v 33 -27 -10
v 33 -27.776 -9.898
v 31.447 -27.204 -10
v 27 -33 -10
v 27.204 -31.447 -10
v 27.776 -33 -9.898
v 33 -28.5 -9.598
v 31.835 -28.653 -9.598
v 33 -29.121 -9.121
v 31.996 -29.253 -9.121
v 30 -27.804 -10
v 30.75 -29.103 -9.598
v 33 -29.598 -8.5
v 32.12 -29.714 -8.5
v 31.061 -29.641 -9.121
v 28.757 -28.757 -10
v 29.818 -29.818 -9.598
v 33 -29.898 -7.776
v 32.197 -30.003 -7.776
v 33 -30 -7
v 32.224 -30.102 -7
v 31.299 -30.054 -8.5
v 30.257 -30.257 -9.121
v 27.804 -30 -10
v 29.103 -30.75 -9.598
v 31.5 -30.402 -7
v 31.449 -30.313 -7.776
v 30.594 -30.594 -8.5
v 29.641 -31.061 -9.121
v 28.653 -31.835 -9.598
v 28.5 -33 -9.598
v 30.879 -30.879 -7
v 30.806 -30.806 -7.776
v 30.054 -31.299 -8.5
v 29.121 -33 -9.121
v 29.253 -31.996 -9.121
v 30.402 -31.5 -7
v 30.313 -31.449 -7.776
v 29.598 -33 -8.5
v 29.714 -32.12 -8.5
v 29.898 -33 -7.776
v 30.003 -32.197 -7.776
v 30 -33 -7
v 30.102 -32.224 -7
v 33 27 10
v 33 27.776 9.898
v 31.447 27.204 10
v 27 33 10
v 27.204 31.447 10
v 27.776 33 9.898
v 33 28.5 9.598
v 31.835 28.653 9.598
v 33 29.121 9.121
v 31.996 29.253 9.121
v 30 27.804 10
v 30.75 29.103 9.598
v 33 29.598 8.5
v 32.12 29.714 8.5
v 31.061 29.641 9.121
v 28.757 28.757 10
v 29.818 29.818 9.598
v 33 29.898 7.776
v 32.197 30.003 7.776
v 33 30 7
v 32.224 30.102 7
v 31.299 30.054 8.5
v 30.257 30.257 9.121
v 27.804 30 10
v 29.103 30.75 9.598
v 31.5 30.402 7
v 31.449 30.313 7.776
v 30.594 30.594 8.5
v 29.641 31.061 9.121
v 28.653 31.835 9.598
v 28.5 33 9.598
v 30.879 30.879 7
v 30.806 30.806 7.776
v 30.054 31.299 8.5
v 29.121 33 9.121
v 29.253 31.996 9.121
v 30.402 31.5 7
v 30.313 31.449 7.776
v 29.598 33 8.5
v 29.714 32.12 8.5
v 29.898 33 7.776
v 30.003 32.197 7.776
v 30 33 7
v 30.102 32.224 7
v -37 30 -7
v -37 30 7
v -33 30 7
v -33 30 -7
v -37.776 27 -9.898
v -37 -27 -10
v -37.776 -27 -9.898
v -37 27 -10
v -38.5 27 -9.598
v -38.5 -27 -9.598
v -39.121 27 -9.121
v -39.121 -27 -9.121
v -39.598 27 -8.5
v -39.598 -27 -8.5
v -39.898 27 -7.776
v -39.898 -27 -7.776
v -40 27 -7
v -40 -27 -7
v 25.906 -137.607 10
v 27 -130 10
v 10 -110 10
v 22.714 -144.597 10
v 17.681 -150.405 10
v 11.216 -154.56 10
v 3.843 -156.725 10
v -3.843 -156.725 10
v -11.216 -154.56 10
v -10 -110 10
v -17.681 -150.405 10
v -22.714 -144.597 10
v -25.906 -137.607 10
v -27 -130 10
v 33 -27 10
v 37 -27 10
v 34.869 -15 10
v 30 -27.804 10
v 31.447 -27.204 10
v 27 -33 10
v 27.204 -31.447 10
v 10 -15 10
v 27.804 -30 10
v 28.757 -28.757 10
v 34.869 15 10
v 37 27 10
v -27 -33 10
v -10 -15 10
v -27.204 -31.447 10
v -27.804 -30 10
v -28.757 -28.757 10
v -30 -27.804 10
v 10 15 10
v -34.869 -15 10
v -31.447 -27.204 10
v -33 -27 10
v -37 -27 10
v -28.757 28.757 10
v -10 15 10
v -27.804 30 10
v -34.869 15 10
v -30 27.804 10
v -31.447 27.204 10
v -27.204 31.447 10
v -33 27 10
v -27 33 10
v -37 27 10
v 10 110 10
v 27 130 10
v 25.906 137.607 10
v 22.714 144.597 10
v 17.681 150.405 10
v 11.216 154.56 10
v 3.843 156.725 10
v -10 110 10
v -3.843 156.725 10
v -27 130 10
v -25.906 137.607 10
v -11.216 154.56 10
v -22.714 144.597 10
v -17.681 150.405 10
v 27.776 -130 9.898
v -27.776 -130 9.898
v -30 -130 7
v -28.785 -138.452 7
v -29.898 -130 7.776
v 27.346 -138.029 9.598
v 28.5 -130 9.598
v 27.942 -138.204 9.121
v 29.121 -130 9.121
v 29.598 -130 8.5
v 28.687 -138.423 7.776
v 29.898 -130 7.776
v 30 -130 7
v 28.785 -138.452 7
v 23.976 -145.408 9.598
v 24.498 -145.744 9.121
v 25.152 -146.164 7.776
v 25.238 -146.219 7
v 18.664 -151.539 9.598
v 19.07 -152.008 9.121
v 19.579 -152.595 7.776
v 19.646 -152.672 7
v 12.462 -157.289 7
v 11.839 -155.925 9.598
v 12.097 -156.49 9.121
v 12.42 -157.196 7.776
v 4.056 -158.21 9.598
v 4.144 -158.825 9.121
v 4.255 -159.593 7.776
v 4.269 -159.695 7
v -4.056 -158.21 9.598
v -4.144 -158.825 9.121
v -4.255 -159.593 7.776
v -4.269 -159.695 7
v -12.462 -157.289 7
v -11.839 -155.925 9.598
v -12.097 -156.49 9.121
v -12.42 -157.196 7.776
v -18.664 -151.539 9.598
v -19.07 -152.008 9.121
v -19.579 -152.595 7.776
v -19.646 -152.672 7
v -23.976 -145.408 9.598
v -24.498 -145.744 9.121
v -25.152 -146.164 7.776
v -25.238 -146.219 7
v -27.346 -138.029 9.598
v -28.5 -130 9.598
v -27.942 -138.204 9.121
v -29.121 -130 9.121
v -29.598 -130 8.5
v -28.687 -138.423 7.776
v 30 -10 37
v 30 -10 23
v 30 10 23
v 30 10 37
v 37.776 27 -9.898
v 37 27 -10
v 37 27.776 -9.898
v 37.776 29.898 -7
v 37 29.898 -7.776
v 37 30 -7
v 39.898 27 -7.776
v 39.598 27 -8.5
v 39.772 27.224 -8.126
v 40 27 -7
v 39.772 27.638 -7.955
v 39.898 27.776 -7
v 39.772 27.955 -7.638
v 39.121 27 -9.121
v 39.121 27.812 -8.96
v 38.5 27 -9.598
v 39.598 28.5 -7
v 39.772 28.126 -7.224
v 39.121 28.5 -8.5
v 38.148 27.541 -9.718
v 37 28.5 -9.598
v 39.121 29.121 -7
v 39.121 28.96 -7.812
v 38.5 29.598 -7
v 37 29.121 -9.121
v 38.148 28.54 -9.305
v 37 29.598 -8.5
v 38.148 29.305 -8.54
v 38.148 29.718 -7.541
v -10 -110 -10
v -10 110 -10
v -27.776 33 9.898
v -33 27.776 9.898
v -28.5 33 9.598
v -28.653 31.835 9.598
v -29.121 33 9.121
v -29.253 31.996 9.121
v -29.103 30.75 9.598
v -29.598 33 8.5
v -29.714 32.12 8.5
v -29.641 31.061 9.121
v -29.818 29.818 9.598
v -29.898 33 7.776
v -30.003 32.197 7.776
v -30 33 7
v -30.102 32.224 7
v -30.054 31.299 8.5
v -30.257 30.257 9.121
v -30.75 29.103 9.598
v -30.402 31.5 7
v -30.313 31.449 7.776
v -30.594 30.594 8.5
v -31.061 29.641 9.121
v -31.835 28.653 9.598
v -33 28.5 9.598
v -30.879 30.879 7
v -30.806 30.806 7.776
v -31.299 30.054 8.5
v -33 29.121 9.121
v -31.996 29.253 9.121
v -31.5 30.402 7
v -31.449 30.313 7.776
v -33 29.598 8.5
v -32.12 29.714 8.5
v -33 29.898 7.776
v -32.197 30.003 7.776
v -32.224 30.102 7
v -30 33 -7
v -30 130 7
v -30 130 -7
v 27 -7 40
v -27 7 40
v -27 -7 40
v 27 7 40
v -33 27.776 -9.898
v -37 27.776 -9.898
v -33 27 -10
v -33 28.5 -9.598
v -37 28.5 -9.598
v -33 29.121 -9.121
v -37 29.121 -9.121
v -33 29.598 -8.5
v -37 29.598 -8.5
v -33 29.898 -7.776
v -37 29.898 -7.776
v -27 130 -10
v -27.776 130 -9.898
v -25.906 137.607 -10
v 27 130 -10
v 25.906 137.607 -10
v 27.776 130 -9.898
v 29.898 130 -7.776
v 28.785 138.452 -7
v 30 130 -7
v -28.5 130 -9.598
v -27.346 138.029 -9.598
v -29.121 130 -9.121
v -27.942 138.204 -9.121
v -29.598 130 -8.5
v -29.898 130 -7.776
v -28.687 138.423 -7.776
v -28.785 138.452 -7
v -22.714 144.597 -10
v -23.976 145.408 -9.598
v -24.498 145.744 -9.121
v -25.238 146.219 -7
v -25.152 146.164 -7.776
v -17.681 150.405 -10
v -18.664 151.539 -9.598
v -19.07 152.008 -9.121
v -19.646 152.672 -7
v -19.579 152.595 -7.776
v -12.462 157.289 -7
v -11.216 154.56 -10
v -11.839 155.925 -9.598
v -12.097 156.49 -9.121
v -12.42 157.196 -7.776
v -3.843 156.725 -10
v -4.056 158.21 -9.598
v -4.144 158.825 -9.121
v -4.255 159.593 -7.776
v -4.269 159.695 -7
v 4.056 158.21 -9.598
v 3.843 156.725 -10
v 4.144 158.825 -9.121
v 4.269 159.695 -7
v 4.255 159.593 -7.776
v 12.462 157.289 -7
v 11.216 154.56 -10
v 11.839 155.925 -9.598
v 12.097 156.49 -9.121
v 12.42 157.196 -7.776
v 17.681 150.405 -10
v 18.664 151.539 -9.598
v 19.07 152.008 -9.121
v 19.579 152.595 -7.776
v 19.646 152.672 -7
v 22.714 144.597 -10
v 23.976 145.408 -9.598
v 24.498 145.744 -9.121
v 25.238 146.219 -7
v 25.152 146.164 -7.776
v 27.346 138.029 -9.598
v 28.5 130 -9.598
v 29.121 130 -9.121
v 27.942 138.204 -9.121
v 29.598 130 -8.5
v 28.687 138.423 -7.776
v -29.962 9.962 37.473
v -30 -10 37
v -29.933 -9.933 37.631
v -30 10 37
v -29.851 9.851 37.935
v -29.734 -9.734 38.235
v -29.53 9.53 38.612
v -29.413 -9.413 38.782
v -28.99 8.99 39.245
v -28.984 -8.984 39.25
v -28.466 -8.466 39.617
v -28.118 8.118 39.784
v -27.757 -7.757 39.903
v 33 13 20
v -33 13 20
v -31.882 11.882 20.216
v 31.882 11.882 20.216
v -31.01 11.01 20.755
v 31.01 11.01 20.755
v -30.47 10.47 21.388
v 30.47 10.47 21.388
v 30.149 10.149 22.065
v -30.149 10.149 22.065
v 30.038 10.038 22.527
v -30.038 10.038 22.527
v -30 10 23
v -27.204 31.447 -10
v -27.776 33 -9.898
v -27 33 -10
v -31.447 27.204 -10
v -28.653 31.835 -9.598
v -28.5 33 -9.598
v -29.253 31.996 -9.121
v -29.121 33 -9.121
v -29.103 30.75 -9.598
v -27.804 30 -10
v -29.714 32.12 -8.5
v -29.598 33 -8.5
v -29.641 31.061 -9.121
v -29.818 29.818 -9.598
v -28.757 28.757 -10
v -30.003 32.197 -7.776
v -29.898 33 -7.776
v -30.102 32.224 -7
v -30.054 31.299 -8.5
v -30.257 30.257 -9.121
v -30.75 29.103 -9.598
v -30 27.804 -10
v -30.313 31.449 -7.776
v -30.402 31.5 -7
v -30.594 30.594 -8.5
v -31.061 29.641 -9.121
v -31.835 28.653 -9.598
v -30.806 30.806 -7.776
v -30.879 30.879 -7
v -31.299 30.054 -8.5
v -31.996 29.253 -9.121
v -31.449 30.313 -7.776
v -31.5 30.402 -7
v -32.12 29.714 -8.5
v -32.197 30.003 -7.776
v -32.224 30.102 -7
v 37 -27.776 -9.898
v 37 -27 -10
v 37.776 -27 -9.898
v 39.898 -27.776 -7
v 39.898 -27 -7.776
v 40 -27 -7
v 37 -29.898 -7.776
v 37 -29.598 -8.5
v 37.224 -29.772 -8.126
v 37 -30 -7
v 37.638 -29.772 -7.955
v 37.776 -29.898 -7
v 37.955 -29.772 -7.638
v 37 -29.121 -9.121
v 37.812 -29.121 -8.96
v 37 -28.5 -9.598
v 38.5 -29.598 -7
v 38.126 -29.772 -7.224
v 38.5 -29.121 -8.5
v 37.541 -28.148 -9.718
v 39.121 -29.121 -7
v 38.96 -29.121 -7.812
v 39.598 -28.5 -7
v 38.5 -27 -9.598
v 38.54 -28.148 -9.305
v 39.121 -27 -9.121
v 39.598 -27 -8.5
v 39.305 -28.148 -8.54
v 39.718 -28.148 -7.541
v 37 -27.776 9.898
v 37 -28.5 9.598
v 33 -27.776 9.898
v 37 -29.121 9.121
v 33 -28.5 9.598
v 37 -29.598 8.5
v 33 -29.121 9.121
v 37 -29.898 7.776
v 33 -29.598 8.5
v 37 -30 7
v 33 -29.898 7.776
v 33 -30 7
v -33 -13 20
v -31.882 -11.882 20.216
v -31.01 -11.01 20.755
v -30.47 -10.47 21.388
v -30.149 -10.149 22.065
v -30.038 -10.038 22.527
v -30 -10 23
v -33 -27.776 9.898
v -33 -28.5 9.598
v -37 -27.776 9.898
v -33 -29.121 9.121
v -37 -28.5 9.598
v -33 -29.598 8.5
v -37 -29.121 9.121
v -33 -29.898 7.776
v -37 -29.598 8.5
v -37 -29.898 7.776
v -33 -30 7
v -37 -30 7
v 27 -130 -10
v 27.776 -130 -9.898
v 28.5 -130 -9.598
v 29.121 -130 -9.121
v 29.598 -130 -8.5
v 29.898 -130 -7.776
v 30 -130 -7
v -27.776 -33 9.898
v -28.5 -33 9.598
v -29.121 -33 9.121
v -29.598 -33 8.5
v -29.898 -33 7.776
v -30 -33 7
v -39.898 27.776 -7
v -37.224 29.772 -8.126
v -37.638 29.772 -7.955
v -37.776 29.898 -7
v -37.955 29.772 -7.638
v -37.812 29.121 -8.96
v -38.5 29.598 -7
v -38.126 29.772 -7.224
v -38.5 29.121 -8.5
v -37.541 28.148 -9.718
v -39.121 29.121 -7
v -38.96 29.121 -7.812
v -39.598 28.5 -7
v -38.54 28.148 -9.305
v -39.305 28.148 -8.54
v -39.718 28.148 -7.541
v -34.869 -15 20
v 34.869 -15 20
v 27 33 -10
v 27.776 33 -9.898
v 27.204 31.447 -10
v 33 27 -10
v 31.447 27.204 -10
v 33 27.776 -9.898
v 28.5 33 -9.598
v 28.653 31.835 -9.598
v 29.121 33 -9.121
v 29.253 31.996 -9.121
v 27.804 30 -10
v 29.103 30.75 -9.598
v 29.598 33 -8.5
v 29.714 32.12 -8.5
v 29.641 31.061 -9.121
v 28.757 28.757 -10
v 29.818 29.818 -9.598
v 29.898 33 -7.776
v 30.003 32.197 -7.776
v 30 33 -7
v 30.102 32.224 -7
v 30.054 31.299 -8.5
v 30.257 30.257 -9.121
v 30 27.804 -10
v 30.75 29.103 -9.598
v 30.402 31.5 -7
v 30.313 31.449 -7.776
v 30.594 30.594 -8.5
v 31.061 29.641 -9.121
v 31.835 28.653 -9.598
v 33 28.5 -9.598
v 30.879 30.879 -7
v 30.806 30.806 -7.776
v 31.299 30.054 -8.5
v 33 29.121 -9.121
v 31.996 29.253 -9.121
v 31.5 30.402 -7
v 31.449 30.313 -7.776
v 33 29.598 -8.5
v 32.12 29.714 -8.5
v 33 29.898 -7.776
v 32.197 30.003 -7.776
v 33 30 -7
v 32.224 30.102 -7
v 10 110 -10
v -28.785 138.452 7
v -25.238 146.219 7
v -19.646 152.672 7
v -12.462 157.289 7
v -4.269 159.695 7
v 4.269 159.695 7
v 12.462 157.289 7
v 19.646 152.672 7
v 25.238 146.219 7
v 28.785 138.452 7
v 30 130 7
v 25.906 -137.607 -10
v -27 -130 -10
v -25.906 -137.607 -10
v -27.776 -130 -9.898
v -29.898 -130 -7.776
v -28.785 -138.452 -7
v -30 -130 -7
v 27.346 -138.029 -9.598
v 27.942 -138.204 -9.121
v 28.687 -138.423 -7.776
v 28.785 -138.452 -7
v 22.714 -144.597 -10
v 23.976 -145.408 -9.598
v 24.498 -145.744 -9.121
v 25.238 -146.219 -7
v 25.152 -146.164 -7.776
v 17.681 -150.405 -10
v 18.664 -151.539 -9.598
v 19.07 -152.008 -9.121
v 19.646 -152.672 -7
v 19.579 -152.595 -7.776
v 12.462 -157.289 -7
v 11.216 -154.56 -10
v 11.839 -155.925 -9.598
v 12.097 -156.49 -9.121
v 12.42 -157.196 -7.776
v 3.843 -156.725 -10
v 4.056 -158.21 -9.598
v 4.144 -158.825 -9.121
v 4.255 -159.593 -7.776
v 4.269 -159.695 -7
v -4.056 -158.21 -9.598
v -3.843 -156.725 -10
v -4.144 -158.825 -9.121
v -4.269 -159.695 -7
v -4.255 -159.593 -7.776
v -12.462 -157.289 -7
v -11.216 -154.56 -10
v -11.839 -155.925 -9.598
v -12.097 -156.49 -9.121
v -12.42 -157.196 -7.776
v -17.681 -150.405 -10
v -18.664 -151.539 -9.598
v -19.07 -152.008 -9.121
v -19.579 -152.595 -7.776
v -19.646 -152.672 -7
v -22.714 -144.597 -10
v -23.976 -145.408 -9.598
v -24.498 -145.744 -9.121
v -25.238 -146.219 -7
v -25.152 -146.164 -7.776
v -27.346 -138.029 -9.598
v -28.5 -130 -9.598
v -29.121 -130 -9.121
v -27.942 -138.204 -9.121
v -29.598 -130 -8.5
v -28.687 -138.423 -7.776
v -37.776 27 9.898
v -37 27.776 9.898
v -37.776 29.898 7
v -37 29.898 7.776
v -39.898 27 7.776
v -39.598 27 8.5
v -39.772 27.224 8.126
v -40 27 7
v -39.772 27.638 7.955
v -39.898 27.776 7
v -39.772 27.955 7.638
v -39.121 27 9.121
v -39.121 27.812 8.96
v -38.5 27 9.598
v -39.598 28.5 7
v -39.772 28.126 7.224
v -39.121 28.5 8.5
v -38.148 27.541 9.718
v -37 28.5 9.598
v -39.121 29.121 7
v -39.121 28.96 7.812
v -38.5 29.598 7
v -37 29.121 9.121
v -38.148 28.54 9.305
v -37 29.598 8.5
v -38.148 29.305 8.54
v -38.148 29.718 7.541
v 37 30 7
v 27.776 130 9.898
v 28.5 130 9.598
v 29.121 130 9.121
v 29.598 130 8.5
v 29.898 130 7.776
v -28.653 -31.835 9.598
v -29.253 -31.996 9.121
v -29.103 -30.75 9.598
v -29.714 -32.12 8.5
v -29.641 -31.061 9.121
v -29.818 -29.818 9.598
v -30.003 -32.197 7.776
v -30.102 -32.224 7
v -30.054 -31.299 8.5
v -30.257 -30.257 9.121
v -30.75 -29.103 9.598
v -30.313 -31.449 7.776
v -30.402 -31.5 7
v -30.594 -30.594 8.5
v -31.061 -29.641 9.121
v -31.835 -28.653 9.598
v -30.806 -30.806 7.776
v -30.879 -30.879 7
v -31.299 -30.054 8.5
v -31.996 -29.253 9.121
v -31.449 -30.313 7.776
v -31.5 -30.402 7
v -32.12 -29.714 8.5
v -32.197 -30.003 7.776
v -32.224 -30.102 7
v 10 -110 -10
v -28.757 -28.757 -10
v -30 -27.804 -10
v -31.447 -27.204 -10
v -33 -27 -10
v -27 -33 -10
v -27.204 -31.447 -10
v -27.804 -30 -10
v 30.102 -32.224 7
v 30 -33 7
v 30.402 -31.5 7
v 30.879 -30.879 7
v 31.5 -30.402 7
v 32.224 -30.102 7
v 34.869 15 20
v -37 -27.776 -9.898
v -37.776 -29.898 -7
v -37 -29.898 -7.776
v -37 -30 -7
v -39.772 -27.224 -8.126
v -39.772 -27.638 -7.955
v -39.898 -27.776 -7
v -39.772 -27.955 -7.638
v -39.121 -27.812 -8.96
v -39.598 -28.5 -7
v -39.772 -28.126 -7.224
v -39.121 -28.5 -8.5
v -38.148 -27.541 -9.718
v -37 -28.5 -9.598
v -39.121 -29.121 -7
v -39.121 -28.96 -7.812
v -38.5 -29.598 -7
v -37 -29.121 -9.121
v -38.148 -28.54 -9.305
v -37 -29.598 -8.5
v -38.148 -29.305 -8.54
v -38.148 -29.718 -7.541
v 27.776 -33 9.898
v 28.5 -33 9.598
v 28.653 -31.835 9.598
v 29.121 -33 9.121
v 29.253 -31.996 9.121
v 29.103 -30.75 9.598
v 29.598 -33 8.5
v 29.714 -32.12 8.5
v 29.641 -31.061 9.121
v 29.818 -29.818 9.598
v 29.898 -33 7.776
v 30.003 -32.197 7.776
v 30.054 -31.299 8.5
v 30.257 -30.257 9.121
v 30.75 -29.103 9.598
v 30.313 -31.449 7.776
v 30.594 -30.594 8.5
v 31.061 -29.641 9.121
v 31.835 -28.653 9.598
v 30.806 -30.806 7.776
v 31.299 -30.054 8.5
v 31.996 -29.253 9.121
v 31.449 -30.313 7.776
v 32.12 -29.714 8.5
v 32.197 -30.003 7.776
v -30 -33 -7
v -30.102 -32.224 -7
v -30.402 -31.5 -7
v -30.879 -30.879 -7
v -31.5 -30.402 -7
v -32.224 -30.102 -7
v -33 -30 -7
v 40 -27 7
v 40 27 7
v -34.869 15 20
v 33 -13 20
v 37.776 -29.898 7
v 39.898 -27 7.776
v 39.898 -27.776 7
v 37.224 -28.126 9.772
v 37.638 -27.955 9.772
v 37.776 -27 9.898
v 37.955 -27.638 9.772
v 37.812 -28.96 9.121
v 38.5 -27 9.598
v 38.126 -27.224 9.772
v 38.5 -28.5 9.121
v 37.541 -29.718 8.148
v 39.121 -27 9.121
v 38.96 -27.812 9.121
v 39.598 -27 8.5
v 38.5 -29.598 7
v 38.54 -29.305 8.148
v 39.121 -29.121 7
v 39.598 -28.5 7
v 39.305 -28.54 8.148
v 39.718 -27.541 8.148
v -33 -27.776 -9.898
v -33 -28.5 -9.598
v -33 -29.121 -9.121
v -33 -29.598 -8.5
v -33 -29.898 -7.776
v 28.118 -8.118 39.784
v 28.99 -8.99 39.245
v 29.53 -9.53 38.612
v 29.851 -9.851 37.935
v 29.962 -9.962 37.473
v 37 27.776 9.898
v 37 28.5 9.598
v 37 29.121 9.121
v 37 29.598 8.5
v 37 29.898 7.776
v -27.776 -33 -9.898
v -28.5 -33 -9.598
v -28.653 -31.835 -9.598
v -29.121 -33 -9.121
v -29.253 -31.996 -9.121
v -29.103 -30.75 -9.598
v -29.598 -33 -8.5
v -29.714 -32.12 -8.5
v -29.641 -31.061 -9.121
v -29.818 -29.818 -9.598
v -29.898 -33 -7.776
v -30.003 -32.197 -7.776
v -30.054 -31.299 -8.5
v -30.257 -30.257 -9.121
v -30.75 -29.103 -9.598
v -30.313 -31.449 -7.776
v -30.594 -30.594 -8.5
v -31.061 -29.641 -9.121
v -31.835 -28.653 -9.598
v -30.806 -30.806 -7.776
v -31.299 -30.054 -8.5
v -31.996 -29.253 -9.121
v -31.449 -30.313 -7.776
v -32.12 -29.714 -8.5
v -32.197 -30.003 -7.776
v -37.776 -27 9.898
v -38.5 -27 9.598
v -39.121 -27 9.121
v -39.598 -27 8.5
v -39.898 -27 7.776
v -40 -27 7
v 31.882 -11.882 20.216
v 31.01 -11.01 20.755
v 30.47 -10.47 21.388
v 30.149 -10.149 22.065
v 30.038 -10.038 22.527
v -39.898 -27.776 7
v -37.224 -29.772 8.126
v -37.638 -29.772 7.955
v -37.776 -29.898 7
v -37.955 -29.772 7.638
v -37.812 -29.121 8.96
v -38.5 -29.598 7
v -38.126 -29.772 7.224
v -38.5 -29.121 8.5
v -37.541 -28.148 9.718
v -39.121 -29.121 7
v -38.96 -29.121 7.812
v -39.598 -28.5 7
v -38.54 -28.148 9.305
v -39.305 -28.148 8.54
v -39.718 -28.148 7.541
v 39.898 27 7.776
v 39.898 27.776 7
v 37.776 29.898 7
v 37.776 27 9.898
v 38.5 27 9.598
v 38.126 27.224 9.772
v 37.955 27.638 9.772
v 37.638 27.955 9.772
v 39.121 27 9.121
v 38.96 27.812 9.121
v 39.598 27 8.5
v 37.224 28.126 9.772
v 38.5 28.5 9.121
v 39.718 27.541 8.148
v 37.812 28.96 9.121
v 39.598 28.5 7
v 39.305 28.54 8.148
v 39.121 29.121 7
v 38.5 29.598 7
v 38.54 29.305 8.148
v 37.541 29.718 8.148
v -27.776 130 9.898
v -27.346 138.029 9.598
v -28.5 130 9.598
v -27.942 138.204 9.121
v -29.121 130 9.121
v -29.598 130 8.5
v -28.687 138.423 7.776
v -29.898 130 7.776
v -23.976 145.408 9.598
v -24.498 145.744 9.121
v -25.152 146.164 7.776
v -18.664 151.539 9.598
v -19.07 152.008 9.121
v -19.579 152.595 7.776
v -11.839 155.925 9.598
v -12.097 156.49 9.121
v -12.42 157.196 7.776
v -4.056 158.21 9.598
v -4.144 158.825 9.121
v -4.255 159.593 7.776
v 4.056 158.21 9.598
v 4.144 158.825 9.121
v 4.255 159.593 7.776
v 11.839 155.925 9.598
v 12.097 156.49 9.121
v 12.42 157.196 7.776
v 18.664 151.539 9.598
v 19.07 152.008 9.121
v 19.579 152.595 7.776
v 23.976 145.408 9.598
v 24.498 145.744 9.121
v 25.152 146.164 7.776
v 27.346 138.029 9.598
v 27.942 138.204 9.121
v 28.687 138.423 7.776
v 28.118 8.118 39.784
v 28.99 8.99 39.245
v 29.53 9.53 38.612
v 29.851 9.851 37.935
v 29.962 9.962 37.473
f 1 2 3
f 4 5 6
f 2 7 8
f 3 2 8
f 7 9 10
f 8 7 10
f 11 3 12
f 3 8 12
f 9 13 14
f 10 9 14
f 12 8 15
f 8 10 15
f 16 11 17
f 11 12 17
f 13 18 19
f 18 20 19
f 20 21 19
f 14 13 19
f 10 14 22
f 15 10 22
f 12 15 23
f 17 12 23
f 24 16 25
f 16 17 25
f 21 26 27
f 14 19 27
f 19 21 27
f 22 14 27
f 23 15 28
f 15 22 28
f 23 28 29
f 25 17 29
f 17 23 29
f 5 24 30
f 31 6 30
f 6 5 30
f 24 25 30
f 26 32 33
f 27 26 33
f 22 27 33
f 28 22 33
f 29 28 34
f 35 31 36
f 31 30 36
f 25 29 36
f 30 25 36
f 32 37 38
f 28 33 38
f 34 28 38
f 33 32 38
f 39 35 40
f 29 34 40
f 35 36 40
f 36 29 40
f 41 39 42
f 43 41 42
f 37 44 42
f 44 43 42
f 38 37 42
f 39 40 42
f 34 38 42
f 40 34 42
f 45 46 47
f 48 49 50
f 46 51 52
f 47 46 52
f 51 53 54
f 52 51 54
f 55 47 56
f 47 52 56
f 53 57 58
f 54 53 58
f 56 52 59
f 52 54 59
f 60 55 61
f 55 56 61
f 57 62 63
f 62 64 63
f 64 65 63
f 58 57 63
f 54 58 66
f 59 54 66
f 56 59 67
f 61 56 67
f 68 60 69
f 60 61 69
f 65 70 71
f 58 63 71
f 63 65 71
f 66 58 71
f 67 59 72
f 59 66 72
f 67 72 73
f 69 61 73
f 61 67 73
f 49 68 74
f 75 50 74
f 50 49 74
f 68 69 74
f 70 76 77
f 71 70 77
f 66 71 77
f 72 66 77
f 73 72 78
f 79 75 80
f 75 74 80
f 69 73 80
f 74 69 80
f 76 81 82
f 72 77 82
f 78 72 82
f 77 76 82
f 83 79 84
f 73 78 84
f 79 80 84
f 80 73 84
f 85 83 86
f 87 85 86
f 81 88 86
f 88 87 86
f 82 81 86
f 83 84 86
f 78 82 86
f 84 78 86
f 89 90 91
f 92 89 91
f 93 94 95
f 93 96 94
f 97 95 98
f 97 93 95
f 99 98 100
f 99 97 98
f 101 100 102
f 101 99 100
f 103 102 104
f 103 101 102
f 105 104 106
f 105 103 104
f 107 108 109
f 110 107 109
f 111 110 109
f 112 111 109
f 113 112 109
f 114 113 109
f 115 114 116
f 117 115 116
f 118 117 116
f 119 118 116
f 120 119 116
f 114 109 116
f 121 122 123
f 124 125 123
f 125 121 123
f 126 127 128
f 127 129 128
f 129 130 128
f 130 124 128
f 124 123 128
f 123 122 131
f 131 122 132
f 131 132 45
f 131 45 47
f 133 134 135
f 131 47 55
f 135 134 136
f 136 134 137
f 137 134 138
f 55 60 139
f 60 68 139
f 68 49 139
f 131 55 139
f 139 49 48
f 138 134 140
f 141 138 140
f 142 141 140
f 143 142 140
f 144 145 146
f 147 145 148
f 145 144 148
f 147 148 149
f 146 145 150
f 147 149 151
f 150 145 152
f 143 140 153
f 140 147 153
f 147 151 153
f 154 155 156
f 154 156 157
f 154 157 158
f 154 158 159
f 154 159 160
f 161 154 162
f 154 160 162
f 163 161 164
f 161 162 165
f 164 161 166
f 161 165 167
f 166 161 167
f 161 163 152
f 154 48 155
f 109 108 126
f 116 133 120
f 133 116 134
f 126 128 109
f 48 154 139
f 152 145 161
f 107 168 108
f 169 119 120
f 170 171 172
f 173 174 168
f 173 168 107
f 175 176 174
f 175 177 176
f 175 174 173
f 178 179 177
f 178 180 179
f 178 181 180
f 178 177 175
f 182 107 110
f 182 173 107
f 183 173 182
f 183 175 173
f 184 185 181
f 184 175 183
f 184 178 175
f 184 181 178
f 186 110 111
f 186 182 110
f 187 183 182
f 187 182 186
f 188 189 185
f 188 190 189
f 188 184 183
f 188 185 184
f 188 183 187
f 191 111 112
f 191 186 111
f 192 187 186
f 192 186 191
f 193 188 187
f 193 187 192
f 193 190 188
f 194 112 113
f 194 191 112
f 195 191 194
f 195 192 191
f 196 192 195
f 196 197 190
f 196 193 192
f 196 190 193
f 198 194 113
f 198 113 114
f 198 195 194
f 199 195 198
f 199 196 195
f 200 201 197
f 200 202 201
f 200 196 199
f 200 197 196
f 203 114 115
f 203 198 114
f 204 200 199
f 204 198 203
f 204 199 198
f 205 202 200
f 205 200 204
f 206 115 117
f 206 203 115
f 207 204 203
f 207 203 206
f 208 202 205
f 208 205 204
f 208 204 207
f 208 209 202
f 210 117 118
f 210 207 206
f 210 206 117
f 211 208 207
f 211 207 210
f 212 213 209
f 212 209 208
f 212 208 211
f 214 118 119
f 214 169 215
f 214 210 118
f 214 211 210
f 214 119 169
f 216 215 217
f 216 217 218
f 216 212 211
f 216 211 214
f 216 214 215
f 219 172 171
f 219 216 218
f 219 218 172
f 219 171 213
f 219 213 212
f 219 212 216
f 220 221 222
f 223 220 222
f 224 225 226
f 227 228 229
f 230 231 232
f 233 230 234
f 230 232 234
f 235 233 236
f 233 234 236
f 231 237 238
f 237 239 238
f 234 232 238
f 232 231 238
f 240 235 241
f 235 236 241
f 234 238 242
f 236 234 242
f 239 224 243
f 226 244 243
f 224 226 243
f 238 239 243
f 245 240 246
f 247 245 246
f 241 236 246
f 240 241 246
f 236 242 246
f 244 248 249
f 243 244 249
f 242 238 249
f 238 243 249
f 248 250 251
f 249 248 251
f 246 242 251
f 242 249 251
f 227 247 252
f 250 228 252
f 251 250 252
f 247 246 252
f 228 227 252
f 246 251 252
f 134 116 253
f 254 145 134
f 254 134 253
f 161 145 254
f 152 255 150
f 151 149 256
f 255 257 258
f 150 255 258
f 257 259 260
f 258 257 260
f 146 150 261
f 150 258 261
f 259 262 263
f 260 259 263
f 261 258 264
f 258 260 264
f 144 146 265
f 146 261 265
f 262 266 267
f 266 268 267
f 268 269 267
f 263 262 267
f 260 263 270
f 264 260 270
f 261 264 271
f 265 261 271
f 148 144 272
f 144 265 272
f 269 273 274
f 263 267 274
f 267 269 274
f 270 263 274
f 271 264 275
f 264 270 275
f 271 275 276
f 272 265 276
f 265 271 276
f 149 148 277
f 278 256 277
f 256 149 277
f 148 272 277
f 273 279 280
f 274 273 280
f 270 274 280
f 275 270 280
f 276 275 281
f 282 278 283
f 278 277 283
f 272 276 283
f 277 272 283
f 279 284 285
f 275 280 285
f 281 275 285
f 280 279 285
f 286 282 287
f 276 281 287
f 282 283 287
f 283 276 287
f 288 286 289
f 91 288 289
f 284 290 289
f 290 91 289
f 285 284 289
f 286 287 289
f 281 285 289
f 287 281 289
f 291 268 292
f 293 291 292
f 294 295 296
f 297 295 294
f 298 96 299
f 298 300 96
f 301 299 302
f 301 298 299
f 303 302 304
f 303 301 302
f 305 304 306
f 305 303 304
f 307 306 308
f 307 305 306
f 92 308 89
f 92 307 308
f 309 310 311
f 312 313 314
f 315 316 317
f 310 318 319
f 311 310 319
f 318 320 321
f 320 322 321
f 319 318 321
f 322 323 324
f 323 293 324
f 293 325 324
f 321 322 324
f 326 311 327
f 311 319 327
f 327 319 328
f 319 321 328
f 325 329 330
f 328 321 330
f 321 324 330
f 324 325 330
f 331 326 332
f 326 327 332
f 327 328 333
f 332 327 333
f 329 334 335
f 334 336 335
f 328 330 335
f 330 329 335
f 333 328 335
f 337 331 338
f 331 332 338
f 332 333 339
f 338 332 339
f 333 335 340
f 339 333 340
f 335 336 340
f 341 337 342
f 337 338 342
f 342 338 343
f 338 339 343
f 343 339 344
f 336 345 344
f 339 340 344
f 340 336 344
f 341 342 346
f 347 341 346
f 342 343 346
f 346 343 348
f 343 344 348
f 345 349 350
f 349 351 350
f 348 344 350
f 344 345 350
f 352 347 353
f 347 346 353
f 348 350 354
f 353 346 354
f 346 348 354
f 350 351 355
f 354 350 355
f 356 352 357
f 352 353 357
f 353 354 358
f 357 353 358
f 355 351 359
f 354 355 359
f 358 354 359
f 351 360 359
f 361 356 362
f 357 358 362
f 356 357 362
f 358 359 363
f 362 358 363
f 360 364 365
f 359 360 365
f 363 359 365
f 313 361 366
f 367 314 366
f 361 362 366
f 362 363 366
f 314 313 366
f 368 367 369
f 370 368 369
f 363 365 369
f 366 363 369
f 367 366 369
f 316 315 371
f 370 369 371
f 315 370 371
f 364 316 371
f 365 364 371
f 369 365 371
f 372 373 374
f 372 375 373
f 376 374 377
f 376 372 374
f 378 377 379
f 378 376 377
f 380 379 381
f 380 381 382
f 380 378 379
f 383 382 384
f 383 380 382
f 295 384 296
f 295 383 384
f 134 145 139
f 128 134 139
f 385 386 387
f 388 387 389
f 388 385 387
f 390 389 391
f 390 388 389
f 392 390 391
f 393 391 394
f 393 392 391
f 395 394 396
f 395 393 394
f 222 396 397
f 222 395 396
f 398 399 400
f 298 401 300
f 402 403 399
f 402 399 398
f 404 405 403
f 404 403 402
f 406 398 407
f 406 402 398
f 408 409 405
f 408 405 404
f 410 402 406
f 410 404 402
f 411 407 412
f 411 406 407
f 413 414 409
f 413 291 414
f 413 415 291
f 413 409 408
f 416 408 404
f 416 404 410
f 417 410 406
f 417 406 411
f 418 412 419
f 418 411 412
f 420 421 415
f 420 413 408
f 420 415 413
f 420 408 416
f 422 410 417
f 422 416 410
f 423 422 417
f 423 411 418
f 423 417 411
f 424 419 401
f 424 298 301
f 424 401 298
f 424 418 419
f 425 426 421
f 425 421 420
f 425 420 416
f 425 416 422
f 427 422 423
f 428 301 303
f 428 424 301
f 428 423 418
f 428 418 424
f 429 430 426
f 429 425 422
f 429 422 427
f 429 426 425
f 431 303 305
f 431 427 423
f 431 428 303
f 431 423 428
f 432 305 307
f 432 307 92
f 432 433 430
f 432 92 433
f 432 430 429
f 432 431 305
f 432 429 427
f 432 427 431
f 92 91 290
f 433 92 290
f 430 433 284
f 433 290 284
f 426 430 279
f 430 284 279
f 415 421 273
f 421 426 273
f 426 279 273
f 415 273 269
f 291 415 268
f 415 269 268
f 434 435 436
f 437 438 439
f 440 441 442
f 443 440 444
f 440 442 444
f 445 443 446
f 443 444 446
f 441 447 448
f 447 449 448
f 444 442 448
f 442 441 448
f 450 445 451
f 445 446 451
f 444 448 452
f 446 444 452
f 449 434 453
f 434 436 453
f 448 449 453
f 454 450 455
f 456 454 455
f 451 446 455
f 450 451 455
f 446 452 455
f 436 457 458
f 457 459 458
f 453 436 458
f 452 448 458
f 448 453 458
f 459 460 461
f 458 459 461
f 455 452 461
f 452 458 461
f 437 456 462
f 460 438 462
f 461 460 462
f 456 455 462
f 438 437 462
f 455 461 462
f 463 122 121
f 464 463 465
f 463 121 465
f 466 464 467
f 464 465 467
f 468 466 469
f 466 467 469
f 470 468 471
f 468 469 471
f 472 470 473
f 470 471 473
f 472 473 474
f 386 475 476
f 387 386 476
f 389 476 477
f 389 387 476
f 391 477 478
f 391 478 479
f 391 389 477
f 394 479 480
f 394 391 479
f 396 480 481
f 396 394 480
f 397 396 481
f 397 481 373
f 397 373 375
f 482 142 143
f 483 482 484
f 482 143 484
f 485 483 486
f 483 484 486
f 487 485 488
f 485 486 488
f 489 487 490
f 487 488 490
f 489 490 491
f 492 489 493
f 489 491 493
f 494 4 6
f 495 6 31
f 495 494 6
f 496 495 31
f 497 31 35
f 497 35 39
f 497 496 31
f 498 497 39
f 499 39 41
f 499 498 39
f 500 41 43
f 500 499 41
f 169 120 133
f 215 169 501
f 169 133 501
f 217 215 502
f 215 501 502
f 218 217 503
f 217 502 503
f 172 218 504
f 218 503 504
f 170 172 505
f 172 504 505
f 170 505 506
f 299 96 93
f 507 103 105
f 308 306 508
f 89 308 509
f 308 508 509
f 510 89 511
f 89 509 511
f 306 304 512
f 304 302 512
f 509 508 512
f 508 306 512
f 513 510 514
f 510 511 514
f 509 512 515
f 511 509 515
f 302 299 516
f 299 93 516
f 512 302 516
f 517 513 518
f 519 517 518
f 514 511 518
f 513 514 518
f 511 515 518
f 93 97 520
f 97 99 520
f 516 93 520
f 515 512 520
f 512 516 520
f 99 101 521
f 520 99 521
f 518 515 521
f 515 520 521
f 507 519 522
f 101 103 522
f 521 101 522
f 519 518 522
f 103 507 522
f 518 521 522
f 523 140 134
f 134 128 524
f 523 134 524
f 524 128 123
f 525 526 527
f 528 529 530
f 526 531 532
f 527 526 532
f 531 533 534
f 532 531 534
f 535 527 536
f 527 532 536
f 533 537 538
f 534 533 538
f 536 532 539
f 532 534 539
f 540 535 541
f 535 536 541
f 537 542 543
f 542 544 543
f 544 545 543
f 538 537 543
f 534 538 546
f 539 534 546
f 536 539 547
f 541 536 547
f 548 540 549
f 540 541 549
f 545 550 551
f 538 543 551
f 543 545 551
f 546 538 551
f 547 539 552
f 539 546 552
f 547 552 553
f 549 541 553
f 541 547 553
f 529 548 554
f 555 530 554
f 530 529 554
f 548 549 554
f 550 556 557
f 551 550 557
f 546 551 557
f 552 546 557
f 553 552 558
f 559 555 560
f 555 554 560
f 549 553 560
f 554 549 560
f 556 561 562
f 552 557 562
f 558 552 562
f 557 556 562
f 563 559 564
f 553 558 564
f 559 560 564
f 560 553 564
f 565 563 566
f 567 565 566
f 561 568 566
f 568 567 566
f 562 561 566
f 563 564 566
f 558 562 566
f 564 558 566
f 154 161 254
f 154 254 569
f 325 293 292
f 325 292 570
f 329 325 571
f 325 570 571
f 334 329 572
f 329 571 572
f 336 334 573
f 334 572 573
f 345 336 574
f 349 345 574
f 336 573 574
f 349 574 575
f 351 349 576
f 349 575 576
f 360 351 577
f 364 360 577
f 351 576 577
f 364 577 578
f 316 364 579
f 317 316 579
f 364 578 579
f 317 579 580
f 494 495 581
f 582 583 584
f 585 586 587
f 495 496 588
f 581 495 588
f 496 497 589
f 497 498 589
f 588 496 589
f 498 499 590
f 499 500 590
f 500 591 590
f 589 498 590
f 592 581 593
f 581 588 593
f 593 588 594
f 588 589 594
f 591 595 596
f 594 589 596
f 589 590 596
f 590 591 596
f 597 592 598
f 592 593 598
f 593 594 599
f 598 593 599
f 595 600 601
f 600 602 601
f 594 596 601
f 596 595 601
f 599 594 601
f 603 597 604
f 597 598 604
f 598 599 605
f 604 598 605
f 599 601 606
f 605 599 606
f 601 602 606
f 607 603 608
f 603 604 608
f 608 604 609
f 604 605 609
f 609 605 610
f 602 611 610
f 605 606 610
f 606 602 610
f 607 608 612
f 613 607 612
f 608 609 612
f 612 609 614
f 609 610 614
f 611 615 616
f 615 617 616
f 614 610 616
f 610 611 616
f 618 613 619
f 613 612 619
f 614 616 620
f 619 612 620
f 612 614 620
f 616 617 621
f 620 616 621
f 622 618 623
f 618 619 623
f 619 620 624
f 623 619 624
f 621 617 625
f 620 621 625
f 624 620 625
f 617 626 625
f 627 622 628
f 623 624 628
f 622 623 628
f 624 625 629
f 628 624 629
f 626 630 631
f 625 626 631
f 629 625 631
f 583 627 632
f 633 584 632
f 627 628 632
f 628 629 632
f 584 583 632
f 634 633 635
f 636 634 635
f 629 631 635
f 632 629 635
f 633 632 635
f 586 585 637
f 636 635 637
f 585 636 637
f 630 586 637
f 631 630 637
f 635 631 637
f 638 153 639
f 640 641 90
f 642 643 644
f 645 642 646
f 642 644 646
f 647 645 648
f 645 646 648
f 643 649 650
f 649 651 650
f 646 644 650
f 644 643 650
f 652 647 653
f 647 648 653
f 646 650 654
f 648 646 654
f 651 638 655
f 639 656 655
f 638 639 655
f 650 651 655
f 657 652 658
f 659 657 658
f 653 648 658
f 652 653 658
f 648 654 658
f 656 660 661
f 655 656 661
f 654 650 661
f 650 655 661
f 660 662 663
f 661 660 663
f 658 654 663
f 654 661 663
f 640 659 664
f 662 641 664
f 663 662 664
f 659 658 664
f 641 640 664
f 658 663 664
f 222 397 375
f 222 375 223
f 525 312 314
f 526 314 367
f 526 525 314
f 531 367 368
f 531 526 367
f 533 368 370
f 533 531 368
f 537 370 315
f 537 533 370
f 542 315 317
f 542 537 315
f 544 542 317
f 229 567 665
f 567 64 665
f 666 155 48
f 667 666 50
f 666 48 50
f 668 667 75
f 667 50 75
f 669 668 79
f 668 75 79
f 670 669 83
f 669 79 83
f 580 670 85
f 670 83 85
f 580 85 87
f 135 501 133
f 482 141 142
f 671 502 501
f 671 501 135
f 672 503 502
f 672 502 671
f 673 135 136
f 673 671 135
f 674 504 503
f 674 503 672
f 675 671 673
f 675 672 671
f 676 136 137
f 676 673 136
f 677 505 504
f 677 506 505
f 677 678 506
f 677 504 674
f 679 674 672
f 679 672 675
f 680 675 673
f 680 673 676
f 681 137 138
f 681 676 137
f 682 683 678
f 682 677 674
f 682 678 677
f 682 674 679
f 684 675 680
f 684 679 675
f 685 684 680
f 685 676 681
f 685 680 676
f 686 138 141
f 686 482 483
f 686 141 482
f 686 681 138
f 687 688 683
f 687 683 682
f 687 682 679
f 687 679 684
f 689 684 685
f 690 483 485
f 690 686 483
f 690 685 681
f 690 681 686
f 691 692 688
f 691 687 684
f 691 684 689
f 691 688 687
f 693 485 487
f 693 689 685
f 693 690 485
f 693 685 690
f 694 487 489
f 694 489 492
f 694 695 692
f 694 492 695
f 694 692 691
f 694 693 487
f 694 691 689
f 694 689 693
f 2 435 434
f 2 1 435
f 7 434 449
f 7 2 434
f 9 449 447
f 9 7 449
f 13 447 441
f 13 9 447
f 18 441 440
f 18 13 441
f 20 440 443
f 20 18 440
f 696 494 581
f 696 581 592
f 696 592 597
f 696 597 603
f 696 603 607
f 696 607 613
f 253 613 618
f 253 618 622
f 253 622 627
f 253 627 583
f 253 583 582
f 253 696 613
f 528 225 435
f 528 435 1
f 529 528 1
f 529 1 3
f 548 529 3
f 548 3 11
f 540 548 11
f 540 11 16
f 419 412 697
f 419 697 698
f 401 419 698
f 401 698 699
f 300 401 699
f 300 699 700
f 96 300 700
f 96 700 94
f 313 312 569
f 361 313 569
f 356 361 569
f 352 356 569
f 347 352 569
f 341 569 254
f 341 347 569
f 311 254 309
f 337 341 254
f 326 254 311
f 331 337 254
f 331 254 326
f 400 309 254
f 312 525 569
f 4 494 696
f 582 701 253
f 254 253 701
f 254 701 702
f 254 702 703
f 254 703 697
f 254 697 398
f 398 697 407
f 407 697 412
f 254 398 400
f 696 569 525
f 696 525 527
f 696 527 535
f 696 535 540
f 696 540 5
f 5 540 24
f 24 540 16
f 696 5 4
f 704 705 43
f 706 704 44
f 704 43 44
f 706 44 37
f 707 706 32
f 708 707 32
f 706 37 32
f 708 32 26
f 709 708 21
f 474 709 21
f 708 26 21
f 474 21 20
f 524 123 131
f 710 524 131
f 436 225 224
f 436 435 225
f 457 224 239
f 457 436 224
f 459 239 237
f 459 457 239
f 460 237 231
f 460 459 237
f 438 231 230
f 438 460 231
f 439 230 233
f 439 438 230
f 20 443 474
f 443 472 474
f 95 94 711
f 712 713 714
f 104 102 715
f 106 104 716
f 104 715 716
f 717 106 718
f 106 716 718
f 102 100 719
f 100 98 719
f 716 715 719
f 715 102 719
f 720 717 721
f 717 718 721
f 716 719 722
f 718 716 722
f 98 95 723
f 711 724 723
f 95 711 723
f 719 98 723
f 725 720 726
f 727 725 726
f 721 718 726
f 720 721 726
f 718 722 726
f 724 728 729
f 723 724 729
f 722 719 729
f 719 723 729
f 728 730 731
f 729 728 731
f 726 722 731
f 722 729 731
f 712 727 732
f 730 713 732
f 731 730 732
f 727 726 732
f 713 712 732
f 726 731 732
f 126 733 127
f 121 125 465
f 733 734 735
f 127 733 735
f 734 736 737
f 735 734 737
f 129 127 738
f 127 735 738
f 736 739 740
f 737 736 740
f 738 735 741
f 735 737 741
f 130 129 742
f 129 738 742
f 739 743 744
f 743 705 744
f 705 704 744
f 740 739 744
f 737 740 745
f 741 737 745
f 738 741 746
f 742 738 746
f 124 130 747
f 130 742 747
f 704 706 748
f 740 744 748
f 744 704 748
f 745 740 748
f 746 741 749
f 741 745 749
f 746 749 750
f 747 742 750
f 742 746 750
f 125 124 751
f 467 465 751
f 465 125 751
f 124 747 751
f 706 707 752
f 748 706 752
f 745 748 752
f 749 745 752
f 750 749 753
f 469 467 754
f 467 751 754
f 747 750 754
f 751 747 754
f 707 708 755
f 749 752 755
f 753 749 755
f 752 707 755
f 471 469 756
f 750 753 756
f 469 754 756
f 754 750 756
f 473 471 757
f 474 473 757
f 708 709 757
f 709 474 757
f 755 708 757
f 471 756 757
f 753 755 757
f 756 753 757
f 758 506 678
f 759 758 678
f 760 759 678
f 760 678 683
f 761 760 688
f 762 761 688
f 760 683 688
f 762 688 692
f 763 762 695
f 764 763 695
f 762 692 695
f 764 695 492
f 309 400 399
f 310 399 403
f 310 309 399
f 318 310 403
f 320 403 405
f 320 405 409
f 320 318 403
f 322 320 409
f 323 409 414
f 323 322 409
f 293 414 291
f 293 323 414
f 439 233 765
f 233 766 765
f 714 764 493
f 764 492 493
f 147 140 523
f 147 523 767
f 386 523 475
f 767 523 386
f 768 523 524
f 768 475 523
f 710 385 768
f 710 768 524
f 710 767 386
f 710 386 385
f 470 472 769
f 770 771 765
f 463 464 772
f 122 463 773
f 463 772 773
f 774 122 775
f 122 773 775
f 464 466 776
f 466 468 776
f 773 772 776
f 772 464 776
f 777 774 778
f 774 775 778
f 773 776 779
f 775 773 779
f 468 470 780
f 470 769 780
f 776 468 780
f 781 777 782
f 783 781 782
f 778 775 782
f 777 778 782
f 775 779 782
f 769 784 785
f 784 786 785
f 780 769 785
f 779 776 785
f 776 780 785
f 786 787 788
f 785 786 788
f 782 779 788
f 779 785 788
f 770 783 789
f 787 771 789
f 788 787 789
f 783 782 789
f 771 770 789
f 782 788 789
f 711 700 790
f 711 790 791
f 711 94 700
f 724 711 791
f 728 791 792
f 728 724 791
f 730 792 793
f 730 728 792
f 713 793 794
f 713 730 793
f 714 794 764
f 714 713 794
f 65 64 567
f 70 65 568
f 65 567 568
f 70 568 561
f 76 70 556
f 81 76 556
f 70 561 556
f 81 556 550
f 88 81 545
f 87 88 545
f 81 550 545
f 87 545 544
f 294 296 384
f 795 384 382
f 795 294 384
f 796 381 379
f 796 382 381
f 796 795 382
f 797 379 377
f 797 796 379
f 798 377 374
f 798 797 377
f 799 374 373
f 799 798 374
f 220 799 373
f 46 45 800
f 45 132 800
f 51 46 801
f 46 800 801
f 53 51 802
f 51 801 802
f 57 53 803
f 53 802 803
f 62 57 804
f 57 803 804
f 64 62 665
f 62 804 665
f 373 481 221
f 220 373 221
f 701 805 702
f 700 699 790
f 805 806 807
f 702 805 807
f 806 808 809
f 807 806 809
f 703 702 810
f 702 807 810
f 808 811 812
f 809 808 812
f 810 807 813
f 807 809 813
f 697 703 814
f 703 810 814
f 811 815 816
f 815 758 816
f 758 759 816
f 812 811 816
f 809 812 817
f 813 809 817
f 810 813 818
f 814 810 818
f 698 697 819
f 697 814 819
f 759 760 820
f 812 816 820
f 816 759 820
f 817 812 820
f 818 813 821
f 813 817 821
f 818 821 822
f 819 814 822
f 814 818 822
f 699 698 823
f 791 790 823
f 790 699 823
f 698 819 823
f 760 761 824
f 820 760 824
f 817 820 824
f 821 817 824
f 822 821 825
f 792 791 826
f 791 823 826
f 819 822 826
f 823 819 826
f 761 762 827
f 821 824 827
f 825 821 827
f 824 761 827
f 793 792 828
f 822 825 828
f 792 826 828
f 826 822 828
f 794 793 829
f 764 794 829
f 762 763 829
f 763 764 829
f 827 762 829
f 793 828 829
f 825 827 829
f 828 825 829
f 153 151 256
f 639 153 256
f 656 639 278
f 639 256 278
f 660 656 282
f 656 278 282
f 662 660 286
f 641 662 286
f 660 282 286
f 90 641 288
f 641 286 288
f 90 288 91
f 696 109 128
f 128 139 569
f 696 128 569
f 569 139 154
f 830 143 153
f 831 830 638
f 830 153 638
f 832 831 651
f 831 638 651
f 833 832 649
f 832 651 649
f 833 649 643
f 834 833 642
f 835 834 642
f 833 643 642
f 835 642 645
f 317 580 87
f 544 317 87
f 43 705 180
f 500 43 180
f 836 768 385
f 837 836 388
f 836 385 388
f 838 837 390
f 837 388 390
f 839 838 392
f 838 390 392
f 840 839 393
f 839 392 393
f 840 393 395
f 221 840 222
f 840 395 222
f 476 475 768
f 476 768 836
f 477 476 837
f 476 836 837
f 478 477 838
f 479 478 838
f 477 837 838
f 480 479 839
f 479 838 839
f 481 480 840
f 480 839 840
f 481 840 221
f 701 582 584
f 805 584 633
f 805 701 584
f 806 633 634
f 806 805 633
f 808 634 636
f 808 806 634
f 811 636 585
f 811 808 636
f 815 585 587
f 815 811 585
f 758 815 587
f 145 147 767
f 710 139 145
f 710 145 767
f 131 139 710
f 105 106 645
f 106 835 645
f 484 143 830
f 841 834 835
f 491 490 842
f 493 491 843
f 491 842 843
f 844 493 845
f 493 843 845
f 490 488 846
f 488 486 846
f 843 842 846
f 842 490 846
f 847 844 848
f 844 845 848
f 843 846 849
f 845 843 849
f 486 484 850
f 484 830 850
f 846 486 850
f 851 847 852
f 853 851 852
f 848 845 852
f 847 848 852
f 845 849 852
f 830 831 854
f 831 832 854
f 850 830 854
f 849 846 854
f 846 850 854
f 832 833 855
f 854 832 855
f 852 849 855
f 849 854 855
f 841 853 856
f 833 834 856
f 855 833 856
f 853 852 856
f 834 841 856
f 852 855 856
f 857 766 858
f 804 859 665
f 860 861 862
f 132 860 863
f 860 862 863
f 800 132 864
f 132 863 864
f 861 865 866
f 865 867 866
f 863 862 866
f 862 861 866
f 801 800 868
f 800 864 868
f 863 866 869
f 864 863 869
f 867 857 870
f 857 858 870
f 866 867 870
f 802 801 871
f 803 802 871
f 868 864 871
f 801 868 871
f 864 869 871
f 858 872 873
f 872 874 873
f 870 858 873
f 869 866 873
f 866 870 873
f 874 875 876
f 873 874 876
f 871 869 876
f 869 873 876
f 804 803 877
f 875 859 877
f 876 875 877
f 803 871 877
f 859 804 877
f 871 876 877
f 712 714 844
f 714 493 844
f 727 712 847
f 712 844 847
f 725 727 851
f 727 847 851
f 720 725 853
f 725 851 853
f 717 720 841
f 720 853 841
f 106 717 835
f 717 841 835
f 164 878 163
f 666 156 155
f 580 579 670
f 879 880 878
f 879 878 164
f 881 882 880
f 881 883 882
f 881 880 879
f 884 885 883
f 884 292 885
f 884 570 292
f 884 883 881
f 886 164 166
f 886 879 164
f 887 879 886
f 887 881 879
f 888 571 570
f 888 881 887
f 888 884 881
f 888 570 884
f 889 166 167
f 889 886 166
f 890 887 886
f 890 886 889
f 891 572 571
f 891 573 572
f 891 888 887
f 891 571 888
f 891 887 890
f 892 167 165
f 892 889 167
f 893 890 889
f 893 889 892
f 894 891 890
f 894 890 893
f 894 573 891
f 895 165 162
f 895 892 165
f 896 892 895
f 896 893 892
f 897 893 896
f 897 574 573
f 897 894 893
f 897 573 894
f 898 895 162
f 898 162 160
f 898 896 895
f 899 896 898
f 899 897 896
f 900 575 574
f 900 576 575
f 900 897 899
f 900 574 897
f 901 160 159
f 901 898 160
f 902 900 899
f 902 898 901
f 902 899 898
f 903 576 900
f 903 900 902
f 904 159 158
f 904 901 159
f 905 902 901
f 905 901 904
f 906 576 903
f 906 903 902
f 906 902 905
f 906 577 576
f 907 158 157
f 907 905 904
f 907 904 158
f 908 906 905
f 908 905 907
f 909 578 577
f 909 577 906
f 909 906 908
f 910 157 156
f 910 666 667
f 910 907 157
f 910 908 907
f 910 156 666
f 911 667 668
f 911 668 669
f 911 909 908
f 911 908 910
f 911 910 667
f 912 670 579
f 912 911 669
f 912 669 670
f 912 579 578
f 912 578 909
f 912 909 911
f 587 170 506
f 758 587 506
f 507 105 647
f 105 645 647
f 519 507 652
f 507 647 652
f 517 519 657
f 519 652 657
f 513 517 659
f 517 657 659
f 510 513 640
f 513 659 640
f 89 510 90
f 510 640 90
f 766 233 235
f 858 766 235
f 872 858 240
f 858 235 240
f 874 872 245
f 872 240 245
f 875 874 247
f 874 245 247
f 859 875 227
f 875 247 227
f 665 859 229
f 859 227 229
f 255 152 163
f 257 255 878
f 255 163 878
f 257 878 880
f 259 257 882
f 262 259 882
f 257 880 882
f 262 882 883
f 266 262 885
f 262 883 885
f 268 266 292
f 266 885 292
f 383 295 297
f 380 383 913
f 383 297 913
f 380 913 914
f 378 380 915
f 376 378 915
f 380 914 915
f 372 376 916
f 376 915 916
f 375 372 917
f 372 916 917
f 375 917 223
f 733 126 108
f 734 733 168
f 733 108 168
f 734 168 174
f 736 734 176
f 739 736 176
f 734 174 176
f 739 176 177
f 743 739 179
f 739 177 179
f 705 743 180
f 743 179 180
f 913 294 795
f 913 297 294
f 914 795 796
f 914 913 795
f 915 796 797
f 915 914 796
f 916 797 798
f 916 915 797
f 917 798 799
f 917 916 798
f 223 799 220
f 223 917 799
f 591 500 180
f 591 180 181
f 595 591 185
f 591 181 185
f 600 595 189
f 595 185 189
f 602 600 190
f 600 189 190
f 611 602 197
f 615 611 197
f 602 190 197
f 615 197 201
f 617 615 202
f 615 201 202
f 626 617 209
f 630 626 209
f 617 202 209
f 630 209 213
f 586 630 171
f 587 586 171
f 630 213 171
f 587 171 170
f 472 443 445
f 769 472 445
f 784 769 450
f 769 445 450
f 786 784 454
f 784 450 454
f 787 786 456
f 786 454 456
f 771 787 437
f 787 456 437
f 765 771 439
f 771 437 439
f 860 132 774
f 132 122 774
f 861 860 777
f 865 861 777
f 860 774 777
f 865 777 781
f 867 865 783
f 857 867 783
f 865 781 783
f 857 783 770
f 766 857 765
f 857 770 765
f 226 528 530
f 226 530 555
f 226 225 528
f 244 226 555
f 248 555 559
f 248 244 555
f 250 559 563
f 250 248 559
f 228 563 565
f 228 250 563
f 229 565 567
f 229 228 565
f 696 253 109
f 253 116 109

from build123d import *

# Parameters (mm, degrees)
SKETCH1_W           = 20
SKETCH1_H           = 220
BOSS_EXTRUDE1_DEPTH = 10
SKETCH2_W           = 60
SKETCH2_H           = 20
BOSS_EXTRUDE2_DEPTH = 30
SKETCH3_W           = 69.73889917
SKETCH3_H           = 30
SKETCH3_W_2         = 60
SKETCH3_H_2         = 20
BOSS_EXTRUDE3_DEPTH = 10
FILLET2_R           = 3


with BuildPart() as part:
    # Sketch1 → Boss-Extrude1 (new, symmetric)
    with BuildSketch(Plane.XY):
        with BuildLine():
            Line((30, 130), (30, 30))
            Line((30, 30), (40, 30))
            Line((40, 30), (40, -30))
            Line((40, -30), (30, -30))
            Line((30, -30), (30, -130))
            ThreePointArc((30, -130), (0, -160), (-30, -130))
            Line((-30, -130), (-30, -30))
            Line((-30, -30), (-40, -30))
            Line((-40, -30), (-40, 30))
            Line((-40, 30), (-30, 30))
            Line((-30, 30), (-30, 130))
            ThreePointArc((-30, 130), (0, 160), (30, 130))
        make_face()
        Rectangle(SKETCH1_W, SKETCH1_H, mode=Mode.SUBTRACT)
    extrude(amount=BOSS_EXTRUDE1_DEPTH, both=True)

    # Sketch2 → Boss-Extrude2 (add)
    with BuildSketch(Plane.XY.offset(10)):
        Rectangle(SKETCH2_W, SKETCH2_H)
    extrude(amount=BOSS_EXTRUDE2_DEPTH)

    # Sketch3 → Boss-Extrude3 (add)
    with BuildSketch(Plane.XY.offset(10)):
        Rectangle(SKETCH3_W, SKETCH3_H)
        Rectangle(SKETCH3_W_2, SKETCH3_H_2, mode=Mode.SUBTRACT)
    extrude(amount=BOSS_EXTRUDE3_DEPTH)

    # Fillet2
    fillet2_edges = [part.edges().sort_by_distance(p)[0] for p in [
        (30, 80, -10),
        (35, 30, -10),
        (-35, 30, 10),
        (40, 0, -10),
        (35, -30, -10),
        (30, -80, -10),
        (0, -160, -10),
        (-30, -80, -10),
        (-35, -30, -10),
        (-40, 0, -10),
        (-35, 30, -10),
        (-30, 80, -10),
        (0, 160, -10),
        (-40, 0, 10),
        (30, 30, 0),
        (40, 30, 0),
        (-35, -30, 10),
        (40, -30, 0),
        (30, -30, 0),
        (-30, -30, 0),
        (-40, -30, 0),
        (-40, 30, 0),
        (-30, 30, 0),
        (-30, -80, 10),
        (0, -160, 10),
        (30, -80, 10),
        (35, -30, 10),
        (40, 0, 10),
        (35, 30, 10),
        (30, 80, 10),
        (0, 160, 10),
        (30, 0, 40),
        (0, 10, 40),
        (-30, 0, 40),
        (0, -10, 40),
        (30, 0, 20),
        (0, 10, 20),
        (-30, 0, 20),
        (0, -10, 20),
        (-30, 80, 10),
    ]]
    fillet(fillet2_edges, radius=FILLET2_R)


solid = part.part
